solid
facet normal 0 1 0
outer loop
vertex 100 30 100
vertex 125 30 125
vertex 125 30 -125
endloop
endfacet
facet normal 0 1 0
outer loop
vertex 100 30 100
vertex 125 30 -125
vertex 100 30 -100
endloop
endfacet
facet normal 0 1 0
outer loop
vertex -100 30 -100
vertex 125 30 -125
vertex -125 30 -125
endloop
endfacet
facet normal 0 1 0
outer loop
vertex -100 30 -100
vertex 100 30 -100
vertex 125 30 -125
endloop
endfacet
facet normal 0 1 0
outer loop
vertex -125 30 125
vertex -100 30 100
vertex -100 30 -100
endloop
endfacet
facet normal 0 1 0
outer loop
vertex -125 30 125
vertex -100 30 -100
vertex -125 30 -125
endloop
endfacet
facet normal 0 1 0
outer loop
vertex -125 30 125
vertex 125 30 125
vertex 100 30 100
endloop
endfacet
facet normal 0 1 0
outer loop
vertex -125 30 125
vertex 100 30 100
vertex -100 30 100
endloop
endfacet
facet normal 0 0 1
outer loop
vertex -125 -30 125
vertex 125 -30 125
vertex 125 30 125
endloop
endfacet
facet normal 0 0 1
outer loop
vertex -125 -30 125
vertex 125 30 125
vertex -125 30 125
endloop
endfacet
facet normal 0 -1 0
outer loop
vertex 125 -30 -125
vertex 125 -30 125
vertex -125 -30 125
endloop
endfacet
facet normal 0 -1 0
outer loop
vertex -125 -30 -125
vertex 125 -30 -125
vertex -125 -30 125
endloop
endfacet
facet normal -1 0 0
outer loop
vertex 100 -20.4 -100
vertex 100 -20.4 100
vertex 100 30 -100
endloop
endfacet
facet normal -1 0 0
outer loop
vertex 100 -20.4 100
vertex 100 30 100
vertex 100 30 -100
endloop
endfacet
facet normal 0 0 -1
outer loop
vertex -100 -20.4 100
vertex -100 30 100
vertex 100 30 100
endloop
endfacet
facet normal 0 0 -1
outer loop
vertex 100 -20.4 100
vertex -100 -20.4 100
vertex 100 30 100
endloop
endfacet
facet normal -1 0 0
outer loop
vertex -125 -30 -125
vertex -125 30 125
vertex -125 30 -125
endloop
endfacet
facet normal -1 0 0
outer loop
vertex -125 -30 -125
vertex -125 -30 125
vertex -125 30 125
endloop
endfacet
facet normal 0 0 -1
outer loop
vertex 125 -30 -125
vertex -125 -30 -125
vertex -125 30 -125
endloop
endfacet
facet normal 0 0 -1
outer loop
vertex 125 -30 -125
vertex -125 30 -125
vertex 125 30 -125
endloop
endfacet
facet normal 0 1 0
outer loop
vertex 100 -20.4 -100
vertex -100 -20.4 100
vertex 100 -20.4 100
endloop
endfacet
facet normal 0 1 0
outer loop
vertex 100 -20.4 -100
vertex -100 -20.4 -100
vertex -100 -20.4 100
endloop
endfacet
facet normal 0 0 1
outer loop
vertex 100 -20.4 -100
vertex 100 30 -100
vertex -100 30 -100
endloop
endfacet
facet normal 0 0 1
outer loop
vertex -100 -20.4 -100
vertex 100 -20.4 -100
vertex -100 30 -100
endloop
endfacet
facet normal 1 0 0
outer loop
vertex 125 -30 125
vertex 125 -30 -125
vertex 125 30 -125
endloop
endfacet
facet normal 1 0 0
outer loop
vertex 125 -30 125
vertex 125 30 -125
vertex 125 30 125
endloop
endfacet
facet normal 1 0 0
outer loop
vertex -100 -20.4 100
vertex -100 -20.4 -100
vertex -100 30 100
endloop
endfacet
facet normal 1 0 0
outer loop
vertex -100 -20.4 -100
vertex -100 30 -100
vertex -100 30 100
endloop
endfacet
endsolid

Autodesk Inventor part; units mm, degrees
ref_plane "YZ Plane" through (0, 0, 0) normal (1, 0, 0) x (0, 1, 0)
ref_plane "XZ Plane" through (0, 0, 0) normal (0, 1, 0) x (-1, 0, 0)
ref_plane "XY Plane" through (0, 0, 0) normal (0, 0, 1) x (1, 0, 0)
sketch "Sketch1" plane through (0, 0, 0) normal (0, 1, 0) x (-1, 0, 0)
  line L0 (-125, 125) -> (125, 125)
  line L1 (125, 125) -> (125, -125)
  line L2 (125, -125) -> (-125, -125)
  line L3 (-125, -125) -> (-125, 125)
  line L4 (-125, 125) -> (125, -125) construction
  line L5 (125, 125) -> (-125, -125) construction
  point P0 (0, 0)
  dimension "d0" = 250
extrude "Extrusion1" add sketch "Sketch1" along normal mid plane 60
sketch "Sketch2" plane through (0, 30, 0) normal (0, 1, 0) x (1, 0, 0)
  line L0 (-100, -100) -> (100, -100)
  line L1 (100, -100) -> (100, 100)
  line L2 (100, 100) -> (-100, 100)
  line L3 (-100, 100) -> (-100, -100)
  line L4 (-100, -100) -> (100, 100) construction
  line L5 (100, -100) -> (-100, 100) construction
  point P0 (0, 0)
  dimension "d3" = 200
extrude "Extrusion2" cut sketch "Sketch2" against normal blind 50.4
properties part number "Box"
